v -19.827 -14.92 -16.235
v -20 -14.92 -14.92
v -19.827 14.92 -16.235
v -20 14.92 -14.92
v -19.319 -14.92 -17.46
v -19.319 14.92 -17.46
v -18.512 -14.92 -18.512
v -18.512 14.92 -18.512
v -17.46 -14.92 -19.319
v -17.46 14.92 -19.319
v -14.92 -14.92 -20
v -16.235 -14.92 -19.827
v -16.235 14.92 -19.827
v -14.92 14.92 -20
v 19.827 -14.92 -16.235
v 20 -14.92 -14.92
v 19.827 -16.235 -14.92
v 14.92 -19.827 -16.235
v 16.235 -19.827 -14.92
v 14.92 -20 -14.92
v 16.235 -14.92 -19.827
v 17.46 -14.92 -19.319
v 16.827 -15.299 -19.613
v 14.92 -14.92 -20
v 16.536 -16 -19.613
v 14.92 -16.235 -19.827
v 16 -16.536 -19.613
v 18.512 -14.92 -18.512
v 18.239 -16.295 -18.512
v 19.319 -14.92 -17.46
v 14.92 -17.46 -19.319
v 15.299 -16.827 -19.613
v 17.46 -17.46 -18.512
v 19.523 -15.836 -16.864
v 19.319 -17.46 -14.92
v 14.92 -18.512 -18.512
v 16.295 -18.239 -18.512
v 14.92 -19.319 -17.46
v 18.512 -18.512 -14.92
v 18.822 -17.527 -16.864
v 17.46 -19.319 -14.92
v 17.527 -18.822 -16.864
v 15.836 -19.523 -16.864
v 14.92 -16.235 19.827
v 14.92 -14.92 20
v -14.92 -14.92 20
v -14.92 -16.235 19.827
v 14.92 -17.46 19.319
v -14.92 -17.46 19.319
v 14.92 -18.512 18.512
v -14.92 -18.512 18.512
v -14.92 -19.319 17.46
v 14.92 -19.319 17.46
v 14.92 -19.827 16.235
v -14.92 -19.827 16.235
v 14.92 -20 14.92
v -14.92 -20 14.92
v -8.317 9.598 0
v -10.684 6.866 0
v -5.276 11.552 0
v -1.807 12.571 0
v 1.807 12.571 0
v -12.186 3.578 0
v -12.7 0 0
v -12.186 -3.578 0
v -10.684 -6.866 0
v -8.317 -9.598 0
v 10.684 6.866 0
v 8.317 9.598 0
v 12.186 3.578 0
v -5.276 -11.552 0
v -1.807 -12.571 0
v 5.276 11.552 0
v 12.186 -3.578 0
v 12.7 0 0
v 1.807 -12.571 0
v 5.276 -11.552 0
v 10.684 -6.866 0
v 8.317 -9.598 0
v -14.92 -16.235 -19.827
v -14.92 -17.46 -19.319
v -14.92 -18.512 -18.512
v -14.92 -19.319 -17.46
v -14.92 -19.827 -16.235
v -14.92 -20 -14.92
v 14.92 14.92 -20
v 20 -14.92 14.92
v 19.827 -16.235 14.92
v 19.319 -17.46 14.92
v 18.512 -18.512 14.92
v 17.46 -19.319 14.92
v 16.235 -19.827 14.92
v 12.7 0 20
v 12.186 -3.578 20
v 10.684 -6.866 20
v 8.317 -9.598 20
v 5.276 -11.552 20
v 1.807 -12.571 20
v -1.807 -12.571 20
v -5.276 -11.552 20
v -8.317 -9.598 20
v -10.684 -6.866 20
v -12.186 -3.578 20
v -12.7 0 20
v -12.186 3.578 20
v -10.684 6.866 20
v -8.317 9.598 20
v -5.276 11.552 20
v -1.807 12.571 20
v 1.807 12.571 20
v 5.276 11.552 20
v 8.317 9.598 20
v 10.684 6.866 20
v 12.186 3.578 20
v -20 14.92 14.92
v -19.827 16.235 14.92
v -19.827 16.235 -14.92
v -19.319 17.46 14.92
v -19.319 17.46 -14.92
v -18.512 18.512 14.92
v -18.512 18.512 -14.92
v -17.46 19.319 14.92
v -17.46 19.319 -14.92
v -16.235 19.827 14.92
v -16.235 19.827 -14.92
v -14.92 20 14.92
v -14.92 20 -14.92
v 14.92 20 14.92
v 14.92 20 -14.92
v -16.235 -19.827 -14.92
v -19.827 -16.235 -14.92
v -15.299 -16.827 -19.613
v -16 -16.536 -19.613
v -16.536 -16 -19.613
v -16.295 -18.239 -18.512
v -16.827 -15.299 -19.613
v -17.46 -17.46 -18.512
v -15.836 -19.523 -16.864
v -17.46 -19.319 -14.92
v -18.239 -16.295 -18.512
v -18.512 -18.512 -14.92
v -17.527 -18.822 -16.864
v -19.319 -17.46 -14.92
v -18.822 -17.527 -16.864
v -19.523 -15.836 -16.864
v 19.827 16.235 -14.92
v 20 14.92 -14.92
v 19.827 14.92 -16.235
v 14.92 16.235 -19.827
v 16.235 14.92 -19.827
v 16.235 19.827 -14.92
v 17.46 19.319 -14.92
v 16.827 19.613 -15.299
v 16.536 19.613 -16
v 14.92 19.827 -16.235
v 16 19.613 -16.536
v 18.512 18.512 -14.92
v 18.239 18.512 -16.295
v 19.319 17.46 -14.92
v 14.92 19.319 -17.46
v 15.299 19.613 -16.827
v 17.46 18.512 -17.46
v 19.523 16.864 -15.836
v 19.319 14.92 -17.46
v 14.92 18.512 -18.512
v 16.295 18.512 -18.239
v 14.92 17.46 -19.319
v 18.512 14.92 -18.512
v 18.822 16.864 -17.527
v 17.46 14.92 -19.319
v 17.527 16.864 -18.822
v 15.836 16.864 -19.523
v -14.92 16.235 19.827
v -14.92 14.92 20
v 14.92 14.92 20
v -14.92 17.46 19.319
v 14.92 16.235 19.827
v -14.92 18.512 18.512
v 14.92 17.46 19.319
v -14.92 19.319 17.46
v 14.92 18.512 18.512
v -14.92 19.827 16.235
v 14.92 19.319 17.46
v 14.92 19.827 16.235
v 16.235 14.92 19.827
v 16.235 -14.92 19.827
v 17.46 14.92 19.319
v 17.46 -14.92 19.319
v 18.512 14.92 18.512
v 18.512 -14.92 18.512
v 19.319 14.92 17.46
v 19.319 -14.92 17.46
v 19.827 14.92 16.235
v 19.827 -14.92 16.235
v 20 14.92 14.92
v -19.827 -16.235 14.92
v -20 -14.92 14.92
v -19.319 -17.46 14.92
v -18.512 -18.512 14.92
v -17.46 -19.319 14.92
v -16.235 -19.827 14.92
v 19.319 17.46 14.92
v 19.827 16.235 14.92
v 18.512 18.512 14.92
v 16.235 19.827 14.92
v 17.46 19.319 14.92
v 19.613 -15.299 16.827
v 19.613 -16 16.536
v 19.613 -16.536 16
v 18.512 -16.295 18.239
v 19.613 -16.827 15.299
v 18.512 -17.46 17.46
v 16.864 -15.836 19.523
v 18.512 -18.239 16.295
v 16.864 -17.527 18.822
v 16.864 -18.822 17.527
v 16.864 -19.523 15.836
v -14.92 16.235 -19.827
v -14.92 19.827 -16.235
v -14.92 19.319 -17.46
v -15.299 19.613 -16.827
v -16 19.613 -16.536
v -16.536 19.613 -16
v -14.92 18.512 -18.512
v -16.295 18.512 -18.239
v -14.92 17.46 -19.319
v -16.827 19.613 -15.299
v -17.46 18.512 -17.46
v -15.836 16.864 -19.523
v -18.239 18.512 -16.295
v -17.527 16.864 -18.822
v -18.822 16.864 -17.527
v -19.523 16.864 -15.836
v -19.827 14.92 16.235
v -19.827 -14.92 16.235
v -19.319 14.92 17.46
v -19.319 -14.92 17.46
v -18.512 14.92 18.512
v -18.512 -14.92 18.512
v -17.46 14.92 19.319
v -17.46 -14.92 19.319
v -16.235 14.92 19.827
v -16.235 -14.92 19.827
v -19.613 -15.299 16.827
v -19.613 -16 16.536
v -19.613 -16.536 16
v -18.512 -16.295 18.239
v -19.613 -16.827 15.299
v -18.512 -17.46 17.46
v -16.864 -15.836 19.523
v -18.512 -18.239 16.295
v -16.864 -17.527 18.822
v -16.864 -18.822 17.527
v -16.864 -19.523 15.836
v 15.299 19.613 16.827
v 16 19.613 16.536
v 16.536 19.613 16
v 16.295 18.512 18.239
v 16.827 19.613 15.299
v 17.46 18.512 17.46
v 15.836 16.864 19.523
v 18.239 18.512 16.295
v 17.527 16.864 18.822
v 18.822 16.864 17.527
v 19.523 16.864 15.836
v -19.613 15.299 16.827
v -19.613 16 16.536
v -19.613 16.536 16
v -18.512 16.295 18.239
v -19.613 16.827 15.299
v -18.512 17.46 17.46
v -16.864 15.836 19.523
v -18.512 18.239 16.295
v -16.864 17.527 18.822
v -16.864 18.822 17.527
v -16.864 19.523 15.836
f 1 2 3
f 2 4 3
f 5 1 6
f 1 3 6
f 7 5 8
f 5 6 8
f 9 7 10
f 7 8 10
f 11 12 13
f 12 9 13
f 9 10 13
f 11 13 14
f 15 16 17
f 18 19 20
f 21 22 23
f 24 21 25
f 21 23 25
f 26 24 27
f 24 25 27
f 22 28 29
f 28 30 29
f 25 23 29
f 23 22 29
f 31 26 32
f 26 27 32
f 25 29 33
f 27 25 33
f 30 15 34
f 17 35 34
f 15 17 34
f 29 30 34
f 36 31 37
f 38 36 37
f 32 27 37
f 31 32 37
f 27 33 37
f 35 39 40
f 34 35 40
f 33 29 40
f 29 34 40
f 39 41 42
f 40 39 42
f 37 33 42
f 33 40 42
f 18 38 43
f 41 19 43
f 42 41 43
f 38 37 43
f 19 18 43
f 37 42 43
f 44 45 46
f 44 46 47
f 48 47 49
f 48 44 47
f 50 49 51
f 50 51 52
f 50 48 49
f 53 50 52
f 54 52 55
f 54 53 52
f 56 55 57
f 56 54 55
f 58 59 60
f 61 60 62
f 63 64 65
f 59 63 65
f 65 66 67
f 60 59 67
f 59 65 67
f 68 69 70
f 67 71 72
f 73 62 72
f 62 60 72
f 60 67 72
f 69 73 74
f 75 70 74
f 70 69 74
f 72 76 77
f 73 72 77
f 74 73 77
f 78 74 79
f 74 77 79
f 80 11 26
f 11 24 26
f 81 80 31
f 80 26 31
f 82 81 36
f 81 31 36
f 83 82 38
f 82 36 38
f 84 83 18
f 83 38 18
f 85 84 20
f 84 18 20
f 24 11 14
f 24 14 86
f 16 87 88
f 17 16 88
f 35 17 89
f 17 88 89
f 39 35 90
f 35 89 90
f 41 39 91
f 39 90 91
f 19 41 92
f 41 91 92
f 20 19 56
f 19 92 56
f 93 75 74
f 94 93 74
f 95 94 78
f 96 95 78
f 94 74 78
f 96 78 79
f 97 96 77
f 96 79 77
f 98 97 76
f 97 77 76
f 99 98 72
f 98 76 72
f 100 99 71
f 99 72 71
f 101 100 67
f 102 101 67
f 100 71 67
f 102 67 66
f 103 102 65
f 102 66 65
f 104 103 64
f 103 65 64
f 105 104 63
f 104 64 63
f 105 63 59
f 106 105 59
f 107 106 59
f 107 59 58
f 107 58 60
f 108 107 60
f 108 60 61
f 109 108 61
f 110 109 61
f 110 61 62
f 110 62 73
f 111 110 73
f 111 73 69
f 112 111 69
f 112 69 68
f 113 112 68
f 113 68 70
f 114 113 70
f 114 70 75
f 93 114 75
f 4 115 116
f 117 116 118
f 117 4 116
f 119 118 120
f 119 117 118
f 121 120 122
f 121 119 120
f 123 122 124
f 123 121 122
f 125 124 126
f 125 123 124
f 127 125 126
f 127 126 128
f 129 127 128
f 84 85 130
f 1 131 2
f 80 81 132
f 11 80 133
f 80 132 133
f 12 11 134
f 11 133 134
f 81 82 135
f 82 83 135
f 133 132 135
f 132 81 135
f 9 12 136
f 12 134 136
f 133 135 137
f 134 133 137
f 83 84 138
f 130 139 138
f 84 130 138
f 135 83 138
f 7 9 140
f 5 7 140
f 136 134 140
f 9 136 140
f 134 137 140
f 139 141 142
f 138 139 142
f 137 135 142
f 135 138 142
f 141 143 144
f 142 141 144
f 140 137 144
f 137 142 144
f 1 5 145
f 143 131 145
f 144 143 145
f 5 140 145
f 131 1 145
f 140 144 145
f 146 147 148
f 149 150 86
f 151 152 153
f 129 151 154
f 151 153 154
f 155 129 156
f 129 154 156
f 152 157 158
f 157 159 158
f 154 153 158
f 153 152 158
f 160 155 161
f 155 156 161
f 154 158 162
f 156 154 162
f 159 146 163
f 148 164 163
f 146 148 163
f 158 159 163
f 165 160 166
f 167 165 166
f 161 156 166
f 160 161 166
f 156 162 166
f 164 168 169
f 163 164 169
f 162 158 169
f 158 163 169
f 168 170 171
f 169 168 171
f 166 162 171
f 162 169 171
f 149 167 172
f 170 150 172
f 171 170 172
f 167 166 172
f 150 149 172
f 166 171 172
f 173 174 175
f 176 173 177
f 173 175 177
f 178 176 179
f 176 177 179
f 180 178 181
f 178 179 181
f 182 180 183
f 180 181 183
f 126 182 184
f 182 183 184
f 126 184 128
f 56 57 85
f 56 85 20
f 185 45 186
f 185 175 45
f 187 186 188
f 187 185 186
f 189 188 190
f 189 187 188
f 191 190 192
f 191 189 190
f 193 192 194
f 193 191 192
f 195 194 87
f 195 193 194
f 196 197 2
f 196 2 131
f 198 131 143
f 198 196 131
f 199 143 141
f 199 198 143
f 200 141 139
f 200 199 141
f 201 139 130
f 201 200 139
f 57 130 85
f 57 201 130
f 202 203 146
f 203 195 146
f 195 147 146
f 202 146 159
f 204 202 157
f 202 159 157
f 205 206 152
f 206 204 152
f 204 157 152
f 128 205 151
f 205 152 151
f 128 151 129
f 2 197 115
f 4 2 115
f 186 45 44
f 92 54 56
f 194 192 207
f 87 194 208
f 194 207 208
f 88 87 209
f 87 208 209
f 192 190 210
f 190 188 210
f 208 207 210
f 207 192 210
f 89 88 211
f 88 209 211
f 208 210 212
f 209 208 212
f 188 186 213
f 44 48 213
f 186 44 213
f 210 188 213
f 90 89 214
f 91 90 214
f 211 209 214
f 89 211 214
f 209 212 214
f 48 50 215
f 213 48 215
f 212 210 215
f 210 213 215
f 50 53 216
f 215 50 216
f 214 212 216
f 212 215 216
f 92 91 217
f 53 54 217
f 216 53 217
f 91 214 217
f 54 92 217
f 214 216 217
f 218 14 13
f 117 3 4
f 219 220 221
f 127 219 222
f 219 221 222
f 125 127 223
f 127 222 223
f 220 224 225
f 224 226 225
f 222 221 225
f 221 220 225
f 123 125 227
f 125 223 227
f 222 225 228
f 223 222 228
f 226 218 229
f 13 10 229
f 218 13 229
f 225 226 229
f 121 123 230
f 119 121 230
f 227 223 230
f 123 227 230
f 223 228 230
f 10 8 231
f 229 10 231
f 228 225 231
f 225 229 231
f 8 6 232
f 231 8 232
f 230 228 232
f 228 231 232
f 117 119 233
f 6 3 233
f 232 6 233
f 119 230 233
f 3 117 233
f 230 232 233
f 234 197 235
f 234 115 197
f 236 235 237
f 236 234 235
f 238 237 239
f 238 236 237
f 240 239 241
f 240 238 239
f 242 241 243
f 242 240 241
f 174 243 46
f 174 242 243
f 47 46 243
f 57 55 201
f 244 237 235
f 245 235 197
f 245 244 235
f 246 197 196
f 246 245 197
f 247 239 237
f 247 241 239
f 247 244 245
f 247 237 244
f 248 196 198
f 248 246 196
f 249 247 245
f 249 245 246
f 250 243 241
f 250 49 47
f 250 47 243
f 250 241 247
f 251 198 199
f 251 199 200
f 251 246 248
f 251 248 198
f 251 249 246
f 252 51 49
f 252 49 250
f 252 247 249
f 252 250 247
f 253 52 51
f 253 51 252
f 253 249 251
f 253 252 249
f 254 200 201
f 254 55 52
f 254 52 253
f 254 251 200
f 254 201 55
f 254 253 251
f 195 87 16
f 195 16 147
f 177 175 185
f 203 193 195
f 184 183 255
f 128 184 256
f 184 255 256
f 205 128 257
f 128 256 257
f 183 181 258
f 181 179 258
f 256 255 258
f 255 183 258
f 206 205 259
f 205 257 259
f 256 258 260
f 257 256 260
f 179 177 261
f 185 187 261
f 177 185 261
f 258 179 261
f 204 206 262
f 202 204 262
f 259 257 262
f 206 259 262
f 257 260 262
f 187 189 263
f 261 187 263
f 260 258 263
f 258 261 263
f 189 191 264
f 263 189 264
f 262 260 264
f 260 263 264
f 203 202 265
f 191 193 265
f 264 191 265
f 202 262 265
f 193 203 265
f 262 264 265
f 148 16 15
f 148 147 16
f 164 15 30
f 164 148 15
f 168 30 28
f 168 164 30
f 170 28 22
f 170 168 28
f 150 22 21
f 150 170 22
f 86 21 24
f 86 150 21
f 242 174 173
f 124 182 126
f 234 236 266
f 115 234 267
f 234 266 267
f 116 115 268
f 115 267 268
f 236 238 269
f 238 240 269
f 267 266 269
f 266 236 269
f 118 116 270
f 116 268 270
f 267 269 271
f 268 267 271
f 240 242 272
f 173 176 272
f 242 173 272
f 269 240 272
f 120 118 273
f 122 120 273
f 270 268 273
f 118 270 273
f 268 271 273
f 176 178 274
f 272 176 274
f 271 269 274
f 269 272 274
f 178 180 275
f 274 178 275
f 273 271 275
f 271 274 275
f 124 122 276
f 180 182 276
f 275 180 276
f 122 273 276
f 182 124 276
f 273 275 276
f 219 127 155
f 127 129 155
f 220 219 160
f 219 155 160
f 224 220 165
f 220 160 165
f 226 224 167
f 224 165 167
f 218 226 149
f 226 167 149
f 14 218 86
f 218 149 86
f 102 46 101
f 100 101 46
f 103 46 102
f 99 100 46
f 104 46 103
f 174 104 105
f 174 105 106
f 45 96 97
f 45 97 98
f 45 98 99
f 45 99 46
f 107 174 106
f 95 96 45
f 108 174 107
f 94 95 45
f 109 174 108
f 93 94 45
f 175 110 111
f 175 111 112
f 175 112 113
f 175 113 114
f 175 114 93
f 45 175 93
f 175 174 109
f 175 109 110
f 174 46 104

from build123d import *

# Parameters (mm, degrees)
F0_W     = 40
F0_H     = 40
F1_DEPTH = 20
F2_R     = 5.08
F3_D     = 25.4
F3_DEPTH = 20.001


with BuildPart() as f1:
    # F0 (on Top) → F1 (new body, symmetric)
    with BuildSketch(Plane.XY):
        Rectangle(F0_W, F0_H)
    extrude(amount=F1_DEPTH, both=True)

    # F2
    f2_edges = [f1.edges().sort_by_distance(p)[0] for p in [
        (0, -20, 20),
        (20, 0, 20),
        (0, 20, 20),
        (-20, 0, 20),
        (-20, -20, 0),
        (20, -20, 0),
        (20, 0, -20),
        (20, 20, 0),
        (0, -20, -20),
        (-20, 0, -20),
        (0, 20, -20),
        (-20, 20, 0),
    ]]
    fillet(f2_edges, radius=F2_R)

    # F3 (through all, one way)
    with BuildSketch(Plane(origin=(0, 0, 0), x_dir=(1, 0, 0), z_dir=(0, 0, -1))):
        with Locations((0, 0)):
            Circle(F3_D / 2)
    extrude(amount=-F3_DEPTH, mode=Mode.SUBTRACT)


solid = f1.part
